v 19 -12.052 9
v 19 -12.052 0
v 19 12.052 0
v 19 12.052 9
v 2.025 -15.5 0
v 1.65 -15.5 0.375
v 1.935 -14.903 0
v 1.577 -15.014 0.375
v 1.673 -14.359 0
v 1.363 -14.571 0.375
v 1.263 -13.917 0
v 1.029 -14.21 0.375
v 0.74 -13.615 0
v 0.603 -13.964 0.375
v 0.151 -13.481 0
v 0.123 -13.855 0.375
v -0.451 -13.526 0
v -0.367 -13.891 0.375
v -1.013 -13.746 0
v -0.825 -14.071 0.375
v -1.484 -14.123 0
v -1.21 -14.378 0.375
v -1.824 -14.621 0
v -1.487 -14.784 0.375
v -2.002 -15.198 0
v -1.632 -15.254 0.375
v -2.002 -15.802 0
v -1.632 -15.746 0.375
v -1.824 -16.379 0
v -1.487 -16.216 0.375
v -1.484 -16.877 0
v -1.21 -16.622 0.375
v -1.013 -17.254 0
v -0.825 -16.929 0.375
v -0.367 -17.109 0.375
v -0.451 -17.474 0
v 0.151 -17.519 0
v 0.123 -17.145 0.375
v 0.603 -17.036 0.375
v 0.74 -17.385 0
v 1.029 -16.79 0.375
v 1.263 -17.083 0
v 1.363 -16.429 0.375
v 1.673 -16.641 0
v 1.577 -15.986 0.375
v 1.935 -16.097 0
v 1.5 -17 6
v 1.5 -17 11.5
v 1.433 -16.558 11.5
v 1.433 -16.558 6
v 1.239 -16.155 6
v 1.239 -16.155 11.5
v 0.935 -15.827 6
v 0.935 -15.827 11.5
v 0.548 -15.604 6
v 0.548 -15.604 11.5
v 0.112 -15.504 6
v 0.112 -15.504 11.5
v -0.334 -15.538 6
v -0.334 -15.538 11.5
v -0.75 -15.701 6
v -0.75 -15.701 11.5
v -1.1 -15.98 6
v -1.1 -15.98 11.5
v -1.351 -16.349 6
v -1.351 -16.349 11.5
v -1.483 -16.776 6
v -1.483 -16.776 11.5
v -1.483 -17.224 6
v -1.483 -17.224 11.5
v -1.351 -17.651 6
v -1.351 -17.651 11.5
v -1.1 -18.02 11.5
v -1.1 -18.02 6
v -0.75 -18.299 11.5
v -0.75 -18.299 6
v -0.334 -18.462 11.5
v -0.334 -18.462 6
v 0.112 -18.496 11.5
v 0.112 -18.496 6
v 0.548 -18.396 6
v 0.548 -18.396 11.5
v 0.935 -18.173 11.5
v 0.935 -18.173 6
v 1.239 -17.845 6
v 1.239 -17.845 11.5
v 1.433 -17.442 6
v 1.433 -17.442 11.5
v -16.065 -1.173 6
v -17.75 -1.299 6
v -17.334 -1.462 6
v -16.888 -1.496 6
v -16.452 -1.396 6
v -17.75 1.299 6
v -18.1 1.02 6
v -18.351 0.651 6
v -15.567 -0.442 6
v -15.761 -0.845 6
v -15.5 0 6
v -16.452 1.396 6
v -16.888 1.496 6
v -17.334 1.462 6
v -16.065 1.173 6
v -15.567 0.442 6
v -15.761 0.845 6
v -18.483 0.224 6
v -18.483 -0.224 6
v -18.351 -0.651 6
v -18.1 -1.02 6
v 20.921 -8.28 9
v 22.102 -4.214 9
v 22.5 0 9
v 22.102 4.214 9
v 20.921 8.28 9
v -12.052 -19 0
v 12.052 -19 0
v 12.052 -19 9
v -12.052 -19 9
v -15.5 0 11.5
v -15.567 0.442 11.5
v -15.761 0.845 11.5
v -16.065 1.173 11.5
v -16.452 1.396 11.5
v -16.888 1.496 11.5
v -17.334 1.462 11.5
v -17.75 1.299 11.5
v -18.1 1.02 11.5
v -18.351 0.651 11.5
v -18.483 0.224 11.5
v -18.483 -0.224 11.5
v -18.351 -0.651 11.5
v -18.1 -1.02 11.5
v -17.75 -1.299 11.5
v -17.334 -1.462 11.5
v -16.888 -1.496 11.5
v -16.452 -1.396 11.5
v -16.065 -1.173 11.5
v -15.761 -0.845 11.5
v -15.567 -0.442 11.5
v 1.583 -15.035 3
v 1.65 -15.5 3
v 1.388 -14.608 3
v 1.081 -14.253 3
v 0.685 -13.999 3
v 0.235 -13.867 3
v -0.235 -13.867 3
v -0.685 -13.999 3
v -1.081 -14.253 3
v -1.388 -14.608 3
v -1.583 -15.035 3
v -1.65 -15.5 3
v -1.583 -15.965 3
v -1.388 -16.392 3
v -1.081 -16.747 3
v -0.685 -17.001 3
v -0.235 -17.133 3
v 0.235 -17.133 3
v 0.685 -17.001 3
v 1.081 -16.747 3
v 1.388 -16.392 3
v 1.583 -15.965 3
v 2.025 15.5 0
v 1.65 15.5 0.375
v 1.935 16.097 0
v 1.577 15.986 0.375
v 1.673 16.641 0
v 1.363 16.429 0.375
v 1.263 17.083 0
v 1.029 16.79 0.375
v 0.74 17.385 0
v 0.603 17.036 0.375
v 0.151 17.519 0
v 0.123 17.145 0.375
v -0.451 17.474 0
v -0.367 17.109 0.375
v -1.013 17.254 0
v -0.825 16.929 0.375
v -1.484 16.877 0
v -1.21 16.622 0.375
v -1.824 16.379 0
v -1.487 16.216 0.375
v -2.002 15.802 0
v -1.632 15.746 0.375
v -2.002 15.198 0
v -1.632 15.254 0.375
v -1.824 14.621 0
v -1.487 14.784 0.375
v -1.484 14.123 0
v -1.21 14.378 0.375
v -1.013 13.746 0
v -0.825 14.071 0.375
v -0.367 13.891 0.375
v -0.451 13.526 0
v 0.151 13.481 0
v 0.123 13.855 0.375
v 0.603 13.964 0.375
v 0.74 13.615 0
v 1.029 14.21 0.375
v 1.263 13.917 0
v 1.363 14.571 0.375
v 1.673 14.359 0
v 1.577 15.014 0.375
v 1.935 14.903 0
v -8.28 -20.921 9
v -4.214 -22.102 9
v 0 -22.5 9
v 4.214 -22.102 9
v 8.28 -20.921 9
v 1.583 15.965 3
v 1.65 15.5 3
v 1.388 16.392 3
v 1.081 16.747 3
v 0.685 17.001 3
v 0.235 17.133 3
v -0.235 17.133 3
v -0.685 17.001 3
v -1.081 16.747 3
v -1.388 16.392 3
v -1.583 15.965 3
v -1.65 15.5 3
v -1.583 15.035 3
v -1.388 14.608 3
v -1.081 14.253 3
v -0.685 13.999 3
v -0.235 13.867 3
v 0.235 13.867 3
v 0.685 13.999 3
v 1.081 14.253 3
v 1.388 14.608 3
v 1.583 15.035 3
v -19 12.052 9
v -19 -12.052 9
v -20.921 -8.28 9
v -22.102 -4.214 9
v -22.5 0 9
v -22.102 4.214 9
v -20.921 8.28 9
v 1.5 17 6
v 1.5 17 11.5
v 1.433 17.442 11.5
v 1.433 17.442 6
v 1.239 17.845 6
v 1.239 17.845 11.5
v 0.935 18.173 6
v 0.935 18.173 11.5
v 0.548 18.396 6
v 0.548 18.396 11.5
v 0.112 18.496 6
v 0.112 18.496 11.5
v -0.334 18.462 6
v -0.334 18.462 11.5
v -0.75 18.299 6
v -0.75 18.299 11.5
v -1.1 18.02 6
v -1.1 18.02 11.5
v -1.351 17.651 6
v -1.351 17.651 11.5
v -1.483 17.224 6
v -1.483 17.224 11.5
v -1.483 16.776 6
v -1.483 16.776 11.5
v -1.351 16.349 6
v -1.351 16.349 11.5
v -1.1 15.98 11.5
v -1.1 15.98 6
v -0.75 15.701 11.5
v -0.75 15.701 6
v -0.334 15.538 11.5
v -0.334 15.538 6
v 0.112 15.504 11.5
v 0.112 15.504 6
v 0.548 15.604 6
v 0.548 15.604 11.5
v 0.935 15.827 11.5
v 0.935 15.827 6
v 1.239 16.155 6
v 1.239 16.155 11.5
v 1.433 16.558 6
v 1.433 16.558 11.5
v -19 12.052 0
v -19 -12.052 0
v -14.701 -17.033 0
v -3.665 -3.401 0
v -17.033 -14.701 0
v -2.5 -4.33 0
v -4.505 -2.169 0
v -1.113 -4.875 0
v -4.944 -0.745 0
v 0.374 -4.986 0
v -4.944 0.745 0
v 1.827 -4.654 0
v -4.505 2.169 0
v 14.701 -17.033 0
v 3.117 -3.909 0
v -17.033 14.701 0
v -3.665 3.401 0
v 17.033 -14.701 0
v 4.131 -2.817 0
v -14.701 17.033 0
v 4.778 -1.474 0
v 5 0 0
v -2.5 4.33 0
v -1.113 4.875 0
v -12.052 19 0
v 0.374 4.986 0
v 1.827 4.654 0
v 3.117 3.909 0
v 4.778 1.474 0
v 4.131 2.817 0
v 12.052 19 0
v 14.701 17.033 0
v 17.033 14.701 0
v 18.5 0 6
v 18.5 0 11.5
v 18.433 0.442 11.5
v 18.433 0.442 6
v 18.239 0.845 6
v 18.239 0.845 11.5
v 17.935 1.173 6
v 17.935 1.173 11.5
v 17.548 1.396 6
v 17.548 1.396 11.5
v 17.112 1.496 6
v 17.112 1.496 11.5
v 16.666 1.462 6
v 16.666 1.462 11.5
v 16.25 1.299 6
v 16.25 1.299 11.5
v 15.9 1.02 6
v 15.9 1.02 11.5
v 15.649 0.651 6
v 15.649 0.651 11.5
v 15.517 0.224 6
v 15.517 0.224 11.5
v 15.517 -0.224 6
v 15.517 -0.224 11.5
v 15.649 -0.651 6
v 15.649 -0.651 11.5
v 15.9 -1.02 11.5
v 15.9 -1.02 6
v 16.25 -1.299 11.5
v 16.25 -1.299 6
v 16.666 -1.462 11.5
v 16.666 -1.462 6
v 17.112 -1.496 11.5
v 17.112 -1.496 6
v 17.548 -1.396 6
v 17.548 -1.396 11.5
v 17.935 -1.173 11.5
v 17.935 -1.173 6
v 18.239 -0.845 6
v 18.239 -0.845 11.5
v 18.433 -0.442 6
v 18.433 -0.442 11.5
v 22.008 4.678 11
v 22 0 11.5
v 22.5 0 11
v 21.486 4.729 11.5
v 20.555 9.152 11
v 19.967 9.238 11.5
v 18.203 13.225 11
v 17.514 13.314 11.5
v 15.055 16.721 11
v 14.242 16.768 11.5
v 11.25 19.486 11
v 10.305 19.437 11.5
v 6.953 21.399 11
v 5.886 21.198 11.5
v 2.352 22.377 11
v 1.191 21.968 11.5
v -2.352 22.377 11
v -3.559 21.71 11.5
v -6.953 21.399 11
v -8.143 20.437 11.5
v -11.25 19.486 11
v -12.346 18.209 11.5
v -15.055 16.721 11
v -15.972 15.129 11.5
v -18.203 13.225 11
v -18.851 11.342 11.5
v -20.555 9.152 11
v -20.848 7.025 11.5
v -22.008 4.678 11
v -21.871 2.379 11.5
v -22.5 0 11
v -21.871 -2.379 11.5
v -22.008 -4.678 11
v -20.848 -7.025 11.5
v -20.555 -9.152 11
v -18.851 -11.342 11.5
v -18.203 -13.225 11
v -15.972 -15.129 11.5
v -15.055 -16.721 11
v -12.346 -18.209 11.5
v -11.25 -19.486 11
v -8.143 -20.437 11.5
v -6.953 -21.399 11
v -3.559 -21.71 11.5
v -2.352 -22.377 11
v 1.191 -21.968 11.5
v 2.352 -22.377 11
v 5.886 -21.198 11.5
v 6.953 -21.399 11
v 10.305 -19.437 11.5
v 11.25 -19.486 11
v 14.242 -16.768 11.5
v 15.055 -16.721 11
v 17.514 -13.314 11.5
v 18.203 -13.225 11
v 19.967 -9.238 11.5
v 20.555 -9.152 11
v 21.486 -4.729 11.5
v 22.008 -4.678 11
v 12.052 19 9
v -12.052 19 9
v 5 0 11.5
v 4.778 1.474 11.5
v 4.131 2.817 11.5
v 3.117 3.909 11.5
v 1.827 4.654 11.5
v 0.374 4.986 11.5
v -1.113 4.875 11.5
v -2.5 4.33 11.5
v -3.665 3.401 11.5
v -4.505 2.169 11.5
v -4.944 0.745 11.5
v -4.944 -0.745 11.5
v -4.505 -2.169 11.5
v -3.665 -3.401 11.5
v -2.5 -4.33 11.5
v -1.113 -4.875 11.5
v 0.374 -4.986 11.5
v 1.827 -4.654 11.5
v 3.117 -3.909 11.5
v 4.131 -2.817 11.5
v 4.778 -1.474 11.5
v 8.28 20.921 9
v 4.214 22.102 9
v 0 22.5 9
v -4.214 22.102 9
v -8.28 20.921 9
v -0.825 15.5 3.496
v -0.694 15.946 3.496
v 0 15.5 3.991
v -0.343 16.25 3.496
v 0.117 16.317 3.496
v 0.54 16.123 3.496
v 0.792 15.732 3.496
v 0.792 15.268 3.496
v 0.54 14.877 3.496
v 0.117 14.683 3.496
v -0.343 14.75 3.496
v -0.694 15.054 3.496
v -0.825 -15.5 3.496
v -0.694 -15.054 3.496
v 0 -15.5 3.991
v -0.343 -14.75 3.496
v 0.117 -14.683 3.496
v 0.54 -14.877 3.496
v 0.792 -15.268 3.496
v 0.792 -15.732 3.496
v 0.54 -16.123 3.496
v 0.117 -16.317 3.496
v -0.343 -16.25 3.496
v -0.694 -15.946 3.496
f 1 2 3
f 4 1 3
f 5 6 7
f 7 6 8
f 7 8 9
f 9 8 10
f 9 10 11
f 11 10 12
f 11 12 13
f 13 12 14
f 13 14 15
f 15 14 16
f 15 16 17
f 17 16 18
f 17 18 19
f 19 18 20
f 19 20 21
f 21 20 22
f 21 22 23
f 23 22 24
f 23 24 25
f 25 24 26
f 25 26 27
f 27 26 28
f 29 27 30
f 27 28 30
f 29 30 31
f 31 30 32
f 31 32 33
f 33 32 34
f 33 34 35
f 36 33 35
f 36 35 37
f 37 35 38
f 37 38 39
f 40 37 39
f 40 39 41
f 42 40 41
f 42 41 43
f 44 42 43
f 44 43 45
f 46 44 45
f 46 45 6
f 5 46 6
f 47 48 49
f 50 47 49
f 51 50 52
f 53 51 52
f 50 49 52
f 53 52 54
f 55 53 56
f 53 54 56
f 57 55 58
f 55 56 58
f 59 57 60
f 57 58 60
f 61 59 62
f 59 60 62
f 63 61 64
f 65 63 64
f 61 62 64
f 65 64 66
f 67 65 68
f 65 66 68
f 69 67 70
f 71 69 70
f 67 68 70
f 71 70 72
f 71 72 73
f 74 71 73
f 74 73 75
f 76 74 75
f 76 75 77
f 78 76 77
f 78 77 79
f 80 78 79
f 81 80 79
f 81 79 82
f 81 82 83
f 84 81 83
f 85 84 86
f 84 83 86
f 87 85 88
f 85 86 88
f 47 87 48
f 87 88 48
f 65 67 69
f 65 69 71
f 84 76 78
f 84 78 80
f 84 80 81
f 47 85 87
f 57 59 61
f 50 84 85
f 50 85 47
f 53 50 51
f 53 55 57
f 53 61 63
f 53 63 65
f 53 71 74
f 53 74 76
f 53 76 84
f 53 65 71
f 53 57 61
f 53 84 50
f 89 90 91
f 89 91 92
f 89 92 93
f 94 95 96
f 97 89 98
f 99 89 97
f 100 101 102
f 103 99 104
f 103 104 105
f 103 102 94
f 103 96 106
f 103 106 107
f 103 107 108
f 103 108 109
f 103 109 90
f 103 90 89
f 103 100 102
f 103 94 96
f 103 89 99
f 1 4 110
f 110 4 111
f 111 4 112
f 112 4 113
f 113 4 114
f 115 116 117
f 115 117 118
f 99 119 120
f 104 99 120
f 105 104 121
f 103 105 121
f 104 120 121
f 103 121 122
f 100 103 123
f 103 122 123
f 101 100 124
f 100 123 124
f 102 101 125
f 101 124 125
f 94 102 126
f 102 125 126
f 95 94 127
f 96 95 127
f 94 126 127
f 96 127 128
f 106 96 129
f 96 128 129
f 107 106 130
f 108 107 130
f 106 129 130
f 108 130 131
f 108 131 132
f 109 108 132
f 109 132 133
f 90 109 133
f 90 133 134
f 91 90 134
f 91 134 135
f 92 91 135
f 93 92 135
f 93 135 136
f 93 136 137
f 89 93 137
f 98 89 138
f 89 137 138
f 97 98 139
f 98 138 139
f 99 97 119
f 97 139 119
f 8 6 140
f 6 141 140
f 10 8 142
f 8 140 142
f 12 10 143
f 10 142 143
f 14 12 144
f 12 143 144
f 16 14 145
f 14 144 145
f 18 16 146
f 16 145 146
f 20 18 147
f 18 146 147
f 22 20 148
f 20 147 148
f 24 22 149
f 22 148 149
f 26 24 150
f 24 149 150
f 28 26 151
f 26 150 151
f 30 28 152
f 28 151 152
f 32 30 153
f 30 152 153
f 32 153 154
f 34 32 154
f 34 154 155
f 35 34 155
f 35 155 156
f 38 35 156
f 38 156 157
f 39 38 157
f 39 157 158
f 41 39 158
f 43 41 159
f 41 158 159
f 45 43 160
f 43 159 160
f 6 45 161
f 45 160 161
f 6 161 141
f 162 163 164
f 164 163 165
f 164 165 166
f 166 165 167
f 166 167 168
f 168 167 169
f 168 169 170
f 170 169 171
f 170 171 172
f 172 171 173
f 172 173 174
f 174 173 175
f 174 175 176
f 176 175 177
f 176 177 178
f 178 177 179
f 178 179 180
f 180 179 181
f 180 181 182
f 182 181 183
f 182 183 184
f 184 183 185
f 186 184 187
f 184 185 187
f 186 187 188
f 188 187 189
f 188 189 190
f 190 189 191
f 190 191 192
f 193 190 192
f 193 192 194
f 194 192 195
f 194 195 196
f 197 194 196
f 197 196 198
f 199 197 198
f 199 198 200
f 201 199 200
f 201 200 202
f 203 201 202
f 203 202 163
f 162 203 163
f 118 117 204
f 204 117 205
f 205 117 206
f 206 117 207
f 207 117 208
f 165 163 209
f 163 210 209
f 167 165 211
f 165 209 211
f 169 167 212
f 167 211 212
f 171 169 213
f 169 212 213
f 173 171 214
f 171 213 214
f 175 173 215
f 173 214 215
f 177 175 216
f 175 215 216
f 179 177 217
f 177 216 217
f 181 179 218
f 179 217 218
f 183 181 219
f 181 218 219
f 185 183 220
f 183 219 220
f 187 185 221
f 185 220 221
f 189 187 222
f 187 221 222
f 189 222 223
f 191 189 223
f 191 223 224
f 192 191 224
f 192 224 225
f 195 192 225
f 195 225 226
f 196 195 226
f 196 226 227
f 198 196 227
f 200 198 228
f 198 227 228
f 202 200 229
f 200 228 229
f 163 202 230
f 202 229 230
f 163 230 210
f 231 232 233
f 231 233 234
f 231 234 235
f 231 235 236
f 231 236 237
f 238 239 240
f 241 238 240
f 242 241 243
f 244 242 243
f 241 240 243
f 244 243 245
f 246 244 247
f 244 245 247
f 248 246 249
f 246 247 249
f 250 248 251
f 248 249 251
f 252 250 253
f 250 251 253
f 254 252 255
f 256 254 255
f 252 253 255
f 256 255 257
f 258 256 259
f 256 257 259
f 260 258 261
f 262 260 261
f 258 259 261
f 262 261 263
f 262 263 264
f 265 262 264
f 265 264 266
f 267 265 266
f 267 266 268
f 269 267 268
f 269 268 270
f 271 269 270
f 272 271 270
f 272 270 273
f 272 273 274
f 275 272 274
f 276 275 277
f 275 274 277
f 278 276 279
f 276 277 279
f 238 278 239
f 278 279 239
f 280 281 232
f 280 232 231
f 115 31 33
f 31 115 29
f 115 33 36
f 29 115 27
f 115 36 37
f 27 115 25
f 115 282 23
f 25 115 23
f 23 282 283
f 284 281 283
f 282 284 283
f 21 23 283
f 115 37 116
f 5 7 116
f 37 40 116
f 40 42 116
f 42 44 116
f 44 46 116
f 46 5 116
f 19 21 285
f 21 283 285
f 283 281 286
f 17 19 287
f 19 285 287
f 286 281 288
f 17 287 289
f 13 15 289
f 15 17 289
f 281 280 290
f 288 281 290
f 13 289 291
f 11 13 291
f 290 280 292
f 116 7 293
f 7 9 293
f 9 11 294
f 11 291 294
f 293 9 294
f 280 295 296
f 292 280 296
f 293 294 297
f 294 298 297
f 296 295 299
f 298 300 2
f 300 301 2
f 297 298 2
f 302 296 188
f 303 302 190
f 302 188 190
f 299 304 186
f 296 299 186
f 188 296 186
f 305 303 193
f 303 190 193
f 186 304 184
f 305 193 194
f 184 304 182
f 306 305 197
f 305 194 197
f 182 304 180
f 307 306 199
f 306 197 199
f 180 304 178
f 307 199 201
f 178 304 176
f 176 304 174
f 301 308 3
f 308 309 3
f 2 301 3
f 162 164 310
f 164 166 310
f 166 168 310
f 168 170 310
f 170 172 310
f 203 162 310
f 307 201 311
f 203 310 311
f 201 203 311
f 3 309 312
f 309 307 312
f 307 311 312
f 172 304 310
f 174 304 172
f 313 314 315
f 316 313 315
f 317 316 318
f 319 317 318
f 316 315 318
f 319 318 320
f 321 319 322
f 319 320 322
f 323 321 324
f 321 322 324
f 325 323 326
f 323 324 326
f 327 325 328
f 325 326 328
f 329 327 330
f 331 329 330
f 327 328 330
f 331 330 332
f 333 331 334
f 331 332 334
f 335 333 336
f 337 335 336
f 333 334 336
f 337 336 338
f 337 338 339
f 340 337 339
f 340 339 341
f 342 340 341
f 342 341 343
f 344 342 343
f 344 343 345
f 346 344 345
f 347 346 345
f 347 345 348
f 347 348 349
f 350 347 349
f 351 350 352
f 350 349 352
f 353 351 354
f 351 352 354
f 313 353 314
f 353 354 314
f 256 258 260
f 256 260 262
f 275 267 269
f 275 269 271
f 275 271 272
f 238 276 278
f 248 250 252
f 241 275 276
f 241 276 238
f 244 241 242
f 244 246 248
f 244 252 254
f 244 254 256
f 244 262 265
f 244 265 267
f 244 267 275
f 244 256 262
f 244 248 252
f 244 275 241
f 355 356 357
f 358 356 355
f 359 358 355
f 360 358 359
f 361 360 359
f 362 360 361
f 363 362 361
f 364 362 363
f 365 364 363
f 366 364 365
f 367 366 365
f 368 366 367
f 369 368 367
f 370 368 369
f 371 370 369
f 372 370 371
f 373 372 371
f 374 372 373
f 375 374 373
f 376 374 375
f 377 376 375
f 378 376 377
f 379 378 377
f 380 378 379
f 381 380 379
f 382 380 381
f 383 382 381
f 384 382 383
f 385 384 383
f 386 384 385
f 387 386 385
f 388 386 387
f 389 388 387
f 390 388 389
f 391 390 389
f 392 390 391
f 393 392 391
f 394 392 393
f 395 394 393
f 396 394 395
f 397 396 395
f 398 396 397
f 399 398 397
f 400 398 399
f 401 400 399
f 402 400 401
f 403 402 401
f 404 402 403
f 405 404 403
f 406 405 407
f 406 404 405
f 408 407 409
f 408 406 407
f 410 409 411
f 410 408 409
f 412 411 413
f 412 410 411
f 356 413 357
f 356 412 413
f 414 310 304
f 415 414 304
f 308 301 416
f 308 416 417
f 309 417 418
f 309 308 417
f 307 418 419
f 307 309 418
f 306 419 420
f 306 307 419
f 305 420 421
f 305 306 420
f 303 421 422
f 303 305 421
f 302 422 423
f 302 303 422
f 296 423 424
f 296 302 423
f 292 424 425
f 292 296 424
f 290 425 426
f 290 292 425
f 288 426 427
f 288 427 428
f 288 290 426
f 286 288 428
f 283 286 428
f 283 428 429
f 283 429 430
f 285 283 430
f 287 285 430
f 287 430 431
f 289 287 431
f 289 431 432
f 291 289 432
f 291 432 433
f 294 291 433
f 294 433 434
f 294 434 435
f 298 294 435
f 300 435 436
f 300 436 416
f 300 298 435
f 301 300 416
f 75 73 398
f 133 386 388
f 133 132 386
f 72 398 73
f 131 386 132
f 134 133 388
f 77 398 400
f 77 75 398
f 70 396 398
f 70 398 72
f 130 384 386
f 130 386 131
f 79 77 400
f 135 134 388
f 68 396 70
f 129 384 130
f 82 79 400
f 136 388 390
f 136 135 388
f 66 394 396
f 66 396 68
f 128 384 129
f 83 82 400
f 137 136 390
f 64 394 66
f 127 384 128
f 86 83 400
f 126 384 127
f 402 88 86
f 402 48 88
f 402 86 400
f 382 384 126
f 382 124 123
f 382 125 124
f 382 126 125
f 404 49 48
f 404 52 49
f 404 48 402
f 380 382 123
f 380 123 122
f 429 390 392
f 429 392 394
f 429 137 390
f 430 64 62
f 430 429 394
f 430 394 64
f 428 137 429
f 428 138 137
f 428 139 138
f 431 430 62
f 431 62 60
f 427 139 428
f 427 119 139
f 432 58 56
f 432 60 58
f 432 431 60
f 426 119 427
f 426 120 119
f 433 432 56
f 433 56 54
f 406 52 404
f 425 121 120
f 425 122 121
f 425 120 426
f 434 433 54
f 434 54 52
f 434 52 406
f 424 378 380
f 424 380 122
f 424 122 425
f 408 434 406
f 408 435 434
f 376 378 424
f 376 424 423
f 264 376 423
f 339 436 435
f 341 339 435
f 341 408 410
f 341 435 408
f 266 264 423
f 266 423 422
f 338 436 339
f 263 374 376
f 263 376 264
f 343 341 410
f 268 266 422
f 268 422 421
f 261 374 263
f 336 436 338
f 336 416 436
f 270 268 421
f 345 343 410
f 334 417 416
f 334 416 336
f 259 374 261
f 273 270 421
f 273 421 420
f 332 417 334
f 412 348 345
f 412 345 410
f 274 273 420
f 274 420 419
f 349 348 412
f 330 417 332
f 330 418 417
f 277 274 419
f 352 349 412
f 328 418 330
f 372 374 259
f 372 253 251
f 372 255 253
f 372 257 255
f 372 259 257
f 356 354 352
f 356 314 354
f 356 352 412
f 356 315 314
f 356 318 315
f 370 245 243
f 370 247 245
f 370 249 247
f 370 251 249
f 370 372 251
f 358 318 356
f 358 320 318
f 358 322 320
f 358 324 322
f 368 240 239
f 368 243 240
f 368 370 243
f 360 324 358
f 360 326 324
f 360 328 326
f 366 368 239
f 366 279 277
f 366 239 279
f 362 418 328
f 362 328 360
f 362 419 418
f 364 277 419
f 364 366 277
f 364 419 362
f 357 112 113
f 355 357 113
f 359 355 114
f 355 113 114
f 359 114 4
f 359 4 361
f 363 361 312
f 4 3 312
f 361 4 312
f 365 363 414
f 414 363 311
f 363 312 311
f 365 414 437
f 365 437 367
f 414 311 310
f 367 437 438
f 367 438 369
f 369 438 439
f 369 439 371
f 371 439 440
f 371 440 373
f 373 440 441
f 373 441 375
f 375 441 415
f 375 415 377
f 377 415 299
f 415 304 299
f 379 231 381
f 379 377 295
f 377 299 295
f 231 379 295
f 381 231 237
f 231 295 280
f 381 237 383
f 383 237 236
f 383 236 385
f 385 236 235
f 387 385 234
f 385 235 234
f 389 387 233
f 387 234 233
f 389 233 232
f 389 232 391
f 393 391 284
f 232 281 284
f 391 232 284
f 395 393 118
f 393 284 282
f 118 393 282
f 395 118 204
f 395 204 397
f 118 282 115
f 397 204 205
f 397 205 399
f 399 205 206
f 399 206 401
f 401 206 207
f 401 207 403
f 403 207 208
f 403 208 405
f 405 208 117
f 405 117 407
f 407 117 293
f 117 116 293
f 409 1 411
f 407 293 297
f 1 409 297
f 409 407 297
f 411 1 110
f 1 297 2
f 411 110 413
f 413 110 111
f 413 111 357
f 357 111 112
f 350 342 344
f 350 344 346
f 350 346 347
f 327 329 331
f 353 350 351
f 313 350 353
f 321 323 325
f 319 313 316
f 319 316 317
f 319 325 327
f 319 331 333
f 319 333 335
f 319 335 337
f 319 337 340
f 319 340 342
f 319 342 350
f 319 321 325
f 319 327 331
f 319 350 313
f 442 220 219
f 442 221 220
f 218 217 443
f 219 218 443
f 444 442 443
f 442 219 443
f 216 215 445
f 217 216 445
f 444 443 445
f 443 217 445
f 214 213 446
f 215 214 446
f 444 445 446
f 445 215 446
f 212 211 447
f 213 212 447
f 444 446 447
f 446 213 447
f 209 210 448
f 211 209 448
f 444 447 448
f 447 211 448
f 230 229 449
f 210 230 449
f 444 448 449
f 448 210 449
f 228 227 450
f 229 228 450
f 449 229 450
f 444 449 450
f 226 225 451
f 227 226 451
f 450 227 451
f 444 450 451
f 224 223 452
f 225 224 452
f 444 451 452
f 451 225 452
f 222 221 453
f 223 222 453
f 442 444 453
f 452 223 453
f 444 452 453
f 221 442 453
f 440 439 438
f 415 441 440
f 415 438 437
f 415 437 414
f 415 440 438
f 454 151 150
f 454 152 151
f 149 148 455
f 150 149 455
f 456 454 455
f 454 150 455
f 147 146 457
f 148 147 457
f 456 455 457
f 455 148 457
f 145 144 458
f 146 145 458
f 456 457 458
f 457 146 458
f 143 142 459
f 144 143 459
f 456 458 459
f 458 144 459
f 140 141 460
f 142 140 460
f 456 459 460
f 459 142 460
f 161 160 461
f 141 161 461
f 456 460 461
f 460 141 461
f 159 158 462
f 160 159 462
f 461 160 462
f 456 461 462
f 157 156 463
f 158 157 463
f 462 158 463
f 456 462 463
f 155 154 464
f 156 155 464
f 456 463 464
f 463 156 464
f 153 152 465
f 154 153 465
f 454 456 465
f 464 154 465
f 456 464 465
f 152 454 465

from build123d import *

# Parameters (mm, degrees)
SKETCH_1_R                   = 22.5
SKETCH_1_R_2                 = 5
EXTRUDE_1_DEPTH              = 11.5
SKETCH_2_R                   = 1.5
CUT_EXTRUDE_1_DEPTH          = 5.5
CHAMFER_1_SIZE               = 0.5
SKETCH_3_OUTSIDE_W           = 59.934
SKETCH_3_OUTSIDE_H           = 59.934
SKETCH_3_OUTSIDE_W_2         = 38
SKETCH_3_OUTSIDE_H_2         = 38
CUT_EXTRUDE_2_DEPTH          = 9
HOLE_WIZARD_M4_1_D           = 3.3
HOLE_WIZARD_M4_1_DEPTH       = 3
HOLE_WIZARD_M4_1_CSINK_D     = 4.05
HOLE_WIZARD_M4_1_CSINK_ANGLE = 90
HOLE_WIZARD_M4_1_TIP         = 0.991420021


with BuildPart() as part:
    # 草图1 → 凸台-拉伸1 (new body)
    with BuildSketch(Plane.XY):
        Circle(SKETCH_1_R)
        Circle(SKETCH_1_R_2, mode=Mode.SUBTRACT)
    extrude(amount=EXTRUDE_1_DEPTH)

    # 草图2 → 切除-拉伸1 (cut)
    with BuildSketch(Plane.XY.offset(11.5)):
        with Locations((0, 17)):
            Circle(SKETCH_2_R)
        with Locations((17, 0)):
            Circle(SKETCH_2_R)
        with Locations((0, -17)):
            Circle(SKETCH_2_R)
        with Locations((-17, 0)):
            Circle(SKETCH_2_R)
    extrude(amount=-CUT_EXTRUDE_1_DEPTH, mode=Mode.SUBTRACT)

    # 倒角1
    chamfer_1_edges = [part.edges().sort_by_distance(p)[0] for p in [
        (-22.5, 0, 11.5),
    ]]
    chamfer(chamfer_1_edges, length=CHAMFER_1_SIZE)

    # 草图3 outside → 切除-拉伸2 (cut)
    with BuildSketch(Plane(origin=(0, 0, 0), x_dir=(-1, 0, 0), z_dir=(0, 0, -1))):
        Rectangle(SKETCH_3_OUTSIDE_W, SKETCH_3_OUTSIDE_H)
        Rectangle(SKETCH_3_OUTSIDE_W_2, SKETCH_3_OUTSIDE_H_2, mode=Mode.SUBTRACT)
    extrude(amount=-CUT_EXTRUDE_2_DEPTH, mode=Mode.SUBTRACT)

    # M4 螺纹孔1
    with Locations(Plane(origin=(0, 0, 0), x_dir=(-1, 0, 0), z_dir=(0, 0, -1))):
        with Locations((0, -15.5), (0, 15.5)):
            CounterSinkHole(HOLE_WIZARD_M4_1_D / 2, HOLE_WIZARD_M4_1_CSINK_D / 2, depth=HOLE_WIZARD_M4_1_DEPTH, counter_sink_angle=HOLE_WIZARD_M4_1_CSINK_ANGLE)
            with Locations((0, 0, -(HOLE_WIZARD_M4_1_DEPTH + HOLE_WIZARD_M4_1_TIP / 2))):  # 118° drill point
                Cone(0, HOLE_WIZARD_M4_1_D / 2, HOLE_WIZARD_M4_1_TIP, mode=Mode.SUBTRACT)


solid = part.part
